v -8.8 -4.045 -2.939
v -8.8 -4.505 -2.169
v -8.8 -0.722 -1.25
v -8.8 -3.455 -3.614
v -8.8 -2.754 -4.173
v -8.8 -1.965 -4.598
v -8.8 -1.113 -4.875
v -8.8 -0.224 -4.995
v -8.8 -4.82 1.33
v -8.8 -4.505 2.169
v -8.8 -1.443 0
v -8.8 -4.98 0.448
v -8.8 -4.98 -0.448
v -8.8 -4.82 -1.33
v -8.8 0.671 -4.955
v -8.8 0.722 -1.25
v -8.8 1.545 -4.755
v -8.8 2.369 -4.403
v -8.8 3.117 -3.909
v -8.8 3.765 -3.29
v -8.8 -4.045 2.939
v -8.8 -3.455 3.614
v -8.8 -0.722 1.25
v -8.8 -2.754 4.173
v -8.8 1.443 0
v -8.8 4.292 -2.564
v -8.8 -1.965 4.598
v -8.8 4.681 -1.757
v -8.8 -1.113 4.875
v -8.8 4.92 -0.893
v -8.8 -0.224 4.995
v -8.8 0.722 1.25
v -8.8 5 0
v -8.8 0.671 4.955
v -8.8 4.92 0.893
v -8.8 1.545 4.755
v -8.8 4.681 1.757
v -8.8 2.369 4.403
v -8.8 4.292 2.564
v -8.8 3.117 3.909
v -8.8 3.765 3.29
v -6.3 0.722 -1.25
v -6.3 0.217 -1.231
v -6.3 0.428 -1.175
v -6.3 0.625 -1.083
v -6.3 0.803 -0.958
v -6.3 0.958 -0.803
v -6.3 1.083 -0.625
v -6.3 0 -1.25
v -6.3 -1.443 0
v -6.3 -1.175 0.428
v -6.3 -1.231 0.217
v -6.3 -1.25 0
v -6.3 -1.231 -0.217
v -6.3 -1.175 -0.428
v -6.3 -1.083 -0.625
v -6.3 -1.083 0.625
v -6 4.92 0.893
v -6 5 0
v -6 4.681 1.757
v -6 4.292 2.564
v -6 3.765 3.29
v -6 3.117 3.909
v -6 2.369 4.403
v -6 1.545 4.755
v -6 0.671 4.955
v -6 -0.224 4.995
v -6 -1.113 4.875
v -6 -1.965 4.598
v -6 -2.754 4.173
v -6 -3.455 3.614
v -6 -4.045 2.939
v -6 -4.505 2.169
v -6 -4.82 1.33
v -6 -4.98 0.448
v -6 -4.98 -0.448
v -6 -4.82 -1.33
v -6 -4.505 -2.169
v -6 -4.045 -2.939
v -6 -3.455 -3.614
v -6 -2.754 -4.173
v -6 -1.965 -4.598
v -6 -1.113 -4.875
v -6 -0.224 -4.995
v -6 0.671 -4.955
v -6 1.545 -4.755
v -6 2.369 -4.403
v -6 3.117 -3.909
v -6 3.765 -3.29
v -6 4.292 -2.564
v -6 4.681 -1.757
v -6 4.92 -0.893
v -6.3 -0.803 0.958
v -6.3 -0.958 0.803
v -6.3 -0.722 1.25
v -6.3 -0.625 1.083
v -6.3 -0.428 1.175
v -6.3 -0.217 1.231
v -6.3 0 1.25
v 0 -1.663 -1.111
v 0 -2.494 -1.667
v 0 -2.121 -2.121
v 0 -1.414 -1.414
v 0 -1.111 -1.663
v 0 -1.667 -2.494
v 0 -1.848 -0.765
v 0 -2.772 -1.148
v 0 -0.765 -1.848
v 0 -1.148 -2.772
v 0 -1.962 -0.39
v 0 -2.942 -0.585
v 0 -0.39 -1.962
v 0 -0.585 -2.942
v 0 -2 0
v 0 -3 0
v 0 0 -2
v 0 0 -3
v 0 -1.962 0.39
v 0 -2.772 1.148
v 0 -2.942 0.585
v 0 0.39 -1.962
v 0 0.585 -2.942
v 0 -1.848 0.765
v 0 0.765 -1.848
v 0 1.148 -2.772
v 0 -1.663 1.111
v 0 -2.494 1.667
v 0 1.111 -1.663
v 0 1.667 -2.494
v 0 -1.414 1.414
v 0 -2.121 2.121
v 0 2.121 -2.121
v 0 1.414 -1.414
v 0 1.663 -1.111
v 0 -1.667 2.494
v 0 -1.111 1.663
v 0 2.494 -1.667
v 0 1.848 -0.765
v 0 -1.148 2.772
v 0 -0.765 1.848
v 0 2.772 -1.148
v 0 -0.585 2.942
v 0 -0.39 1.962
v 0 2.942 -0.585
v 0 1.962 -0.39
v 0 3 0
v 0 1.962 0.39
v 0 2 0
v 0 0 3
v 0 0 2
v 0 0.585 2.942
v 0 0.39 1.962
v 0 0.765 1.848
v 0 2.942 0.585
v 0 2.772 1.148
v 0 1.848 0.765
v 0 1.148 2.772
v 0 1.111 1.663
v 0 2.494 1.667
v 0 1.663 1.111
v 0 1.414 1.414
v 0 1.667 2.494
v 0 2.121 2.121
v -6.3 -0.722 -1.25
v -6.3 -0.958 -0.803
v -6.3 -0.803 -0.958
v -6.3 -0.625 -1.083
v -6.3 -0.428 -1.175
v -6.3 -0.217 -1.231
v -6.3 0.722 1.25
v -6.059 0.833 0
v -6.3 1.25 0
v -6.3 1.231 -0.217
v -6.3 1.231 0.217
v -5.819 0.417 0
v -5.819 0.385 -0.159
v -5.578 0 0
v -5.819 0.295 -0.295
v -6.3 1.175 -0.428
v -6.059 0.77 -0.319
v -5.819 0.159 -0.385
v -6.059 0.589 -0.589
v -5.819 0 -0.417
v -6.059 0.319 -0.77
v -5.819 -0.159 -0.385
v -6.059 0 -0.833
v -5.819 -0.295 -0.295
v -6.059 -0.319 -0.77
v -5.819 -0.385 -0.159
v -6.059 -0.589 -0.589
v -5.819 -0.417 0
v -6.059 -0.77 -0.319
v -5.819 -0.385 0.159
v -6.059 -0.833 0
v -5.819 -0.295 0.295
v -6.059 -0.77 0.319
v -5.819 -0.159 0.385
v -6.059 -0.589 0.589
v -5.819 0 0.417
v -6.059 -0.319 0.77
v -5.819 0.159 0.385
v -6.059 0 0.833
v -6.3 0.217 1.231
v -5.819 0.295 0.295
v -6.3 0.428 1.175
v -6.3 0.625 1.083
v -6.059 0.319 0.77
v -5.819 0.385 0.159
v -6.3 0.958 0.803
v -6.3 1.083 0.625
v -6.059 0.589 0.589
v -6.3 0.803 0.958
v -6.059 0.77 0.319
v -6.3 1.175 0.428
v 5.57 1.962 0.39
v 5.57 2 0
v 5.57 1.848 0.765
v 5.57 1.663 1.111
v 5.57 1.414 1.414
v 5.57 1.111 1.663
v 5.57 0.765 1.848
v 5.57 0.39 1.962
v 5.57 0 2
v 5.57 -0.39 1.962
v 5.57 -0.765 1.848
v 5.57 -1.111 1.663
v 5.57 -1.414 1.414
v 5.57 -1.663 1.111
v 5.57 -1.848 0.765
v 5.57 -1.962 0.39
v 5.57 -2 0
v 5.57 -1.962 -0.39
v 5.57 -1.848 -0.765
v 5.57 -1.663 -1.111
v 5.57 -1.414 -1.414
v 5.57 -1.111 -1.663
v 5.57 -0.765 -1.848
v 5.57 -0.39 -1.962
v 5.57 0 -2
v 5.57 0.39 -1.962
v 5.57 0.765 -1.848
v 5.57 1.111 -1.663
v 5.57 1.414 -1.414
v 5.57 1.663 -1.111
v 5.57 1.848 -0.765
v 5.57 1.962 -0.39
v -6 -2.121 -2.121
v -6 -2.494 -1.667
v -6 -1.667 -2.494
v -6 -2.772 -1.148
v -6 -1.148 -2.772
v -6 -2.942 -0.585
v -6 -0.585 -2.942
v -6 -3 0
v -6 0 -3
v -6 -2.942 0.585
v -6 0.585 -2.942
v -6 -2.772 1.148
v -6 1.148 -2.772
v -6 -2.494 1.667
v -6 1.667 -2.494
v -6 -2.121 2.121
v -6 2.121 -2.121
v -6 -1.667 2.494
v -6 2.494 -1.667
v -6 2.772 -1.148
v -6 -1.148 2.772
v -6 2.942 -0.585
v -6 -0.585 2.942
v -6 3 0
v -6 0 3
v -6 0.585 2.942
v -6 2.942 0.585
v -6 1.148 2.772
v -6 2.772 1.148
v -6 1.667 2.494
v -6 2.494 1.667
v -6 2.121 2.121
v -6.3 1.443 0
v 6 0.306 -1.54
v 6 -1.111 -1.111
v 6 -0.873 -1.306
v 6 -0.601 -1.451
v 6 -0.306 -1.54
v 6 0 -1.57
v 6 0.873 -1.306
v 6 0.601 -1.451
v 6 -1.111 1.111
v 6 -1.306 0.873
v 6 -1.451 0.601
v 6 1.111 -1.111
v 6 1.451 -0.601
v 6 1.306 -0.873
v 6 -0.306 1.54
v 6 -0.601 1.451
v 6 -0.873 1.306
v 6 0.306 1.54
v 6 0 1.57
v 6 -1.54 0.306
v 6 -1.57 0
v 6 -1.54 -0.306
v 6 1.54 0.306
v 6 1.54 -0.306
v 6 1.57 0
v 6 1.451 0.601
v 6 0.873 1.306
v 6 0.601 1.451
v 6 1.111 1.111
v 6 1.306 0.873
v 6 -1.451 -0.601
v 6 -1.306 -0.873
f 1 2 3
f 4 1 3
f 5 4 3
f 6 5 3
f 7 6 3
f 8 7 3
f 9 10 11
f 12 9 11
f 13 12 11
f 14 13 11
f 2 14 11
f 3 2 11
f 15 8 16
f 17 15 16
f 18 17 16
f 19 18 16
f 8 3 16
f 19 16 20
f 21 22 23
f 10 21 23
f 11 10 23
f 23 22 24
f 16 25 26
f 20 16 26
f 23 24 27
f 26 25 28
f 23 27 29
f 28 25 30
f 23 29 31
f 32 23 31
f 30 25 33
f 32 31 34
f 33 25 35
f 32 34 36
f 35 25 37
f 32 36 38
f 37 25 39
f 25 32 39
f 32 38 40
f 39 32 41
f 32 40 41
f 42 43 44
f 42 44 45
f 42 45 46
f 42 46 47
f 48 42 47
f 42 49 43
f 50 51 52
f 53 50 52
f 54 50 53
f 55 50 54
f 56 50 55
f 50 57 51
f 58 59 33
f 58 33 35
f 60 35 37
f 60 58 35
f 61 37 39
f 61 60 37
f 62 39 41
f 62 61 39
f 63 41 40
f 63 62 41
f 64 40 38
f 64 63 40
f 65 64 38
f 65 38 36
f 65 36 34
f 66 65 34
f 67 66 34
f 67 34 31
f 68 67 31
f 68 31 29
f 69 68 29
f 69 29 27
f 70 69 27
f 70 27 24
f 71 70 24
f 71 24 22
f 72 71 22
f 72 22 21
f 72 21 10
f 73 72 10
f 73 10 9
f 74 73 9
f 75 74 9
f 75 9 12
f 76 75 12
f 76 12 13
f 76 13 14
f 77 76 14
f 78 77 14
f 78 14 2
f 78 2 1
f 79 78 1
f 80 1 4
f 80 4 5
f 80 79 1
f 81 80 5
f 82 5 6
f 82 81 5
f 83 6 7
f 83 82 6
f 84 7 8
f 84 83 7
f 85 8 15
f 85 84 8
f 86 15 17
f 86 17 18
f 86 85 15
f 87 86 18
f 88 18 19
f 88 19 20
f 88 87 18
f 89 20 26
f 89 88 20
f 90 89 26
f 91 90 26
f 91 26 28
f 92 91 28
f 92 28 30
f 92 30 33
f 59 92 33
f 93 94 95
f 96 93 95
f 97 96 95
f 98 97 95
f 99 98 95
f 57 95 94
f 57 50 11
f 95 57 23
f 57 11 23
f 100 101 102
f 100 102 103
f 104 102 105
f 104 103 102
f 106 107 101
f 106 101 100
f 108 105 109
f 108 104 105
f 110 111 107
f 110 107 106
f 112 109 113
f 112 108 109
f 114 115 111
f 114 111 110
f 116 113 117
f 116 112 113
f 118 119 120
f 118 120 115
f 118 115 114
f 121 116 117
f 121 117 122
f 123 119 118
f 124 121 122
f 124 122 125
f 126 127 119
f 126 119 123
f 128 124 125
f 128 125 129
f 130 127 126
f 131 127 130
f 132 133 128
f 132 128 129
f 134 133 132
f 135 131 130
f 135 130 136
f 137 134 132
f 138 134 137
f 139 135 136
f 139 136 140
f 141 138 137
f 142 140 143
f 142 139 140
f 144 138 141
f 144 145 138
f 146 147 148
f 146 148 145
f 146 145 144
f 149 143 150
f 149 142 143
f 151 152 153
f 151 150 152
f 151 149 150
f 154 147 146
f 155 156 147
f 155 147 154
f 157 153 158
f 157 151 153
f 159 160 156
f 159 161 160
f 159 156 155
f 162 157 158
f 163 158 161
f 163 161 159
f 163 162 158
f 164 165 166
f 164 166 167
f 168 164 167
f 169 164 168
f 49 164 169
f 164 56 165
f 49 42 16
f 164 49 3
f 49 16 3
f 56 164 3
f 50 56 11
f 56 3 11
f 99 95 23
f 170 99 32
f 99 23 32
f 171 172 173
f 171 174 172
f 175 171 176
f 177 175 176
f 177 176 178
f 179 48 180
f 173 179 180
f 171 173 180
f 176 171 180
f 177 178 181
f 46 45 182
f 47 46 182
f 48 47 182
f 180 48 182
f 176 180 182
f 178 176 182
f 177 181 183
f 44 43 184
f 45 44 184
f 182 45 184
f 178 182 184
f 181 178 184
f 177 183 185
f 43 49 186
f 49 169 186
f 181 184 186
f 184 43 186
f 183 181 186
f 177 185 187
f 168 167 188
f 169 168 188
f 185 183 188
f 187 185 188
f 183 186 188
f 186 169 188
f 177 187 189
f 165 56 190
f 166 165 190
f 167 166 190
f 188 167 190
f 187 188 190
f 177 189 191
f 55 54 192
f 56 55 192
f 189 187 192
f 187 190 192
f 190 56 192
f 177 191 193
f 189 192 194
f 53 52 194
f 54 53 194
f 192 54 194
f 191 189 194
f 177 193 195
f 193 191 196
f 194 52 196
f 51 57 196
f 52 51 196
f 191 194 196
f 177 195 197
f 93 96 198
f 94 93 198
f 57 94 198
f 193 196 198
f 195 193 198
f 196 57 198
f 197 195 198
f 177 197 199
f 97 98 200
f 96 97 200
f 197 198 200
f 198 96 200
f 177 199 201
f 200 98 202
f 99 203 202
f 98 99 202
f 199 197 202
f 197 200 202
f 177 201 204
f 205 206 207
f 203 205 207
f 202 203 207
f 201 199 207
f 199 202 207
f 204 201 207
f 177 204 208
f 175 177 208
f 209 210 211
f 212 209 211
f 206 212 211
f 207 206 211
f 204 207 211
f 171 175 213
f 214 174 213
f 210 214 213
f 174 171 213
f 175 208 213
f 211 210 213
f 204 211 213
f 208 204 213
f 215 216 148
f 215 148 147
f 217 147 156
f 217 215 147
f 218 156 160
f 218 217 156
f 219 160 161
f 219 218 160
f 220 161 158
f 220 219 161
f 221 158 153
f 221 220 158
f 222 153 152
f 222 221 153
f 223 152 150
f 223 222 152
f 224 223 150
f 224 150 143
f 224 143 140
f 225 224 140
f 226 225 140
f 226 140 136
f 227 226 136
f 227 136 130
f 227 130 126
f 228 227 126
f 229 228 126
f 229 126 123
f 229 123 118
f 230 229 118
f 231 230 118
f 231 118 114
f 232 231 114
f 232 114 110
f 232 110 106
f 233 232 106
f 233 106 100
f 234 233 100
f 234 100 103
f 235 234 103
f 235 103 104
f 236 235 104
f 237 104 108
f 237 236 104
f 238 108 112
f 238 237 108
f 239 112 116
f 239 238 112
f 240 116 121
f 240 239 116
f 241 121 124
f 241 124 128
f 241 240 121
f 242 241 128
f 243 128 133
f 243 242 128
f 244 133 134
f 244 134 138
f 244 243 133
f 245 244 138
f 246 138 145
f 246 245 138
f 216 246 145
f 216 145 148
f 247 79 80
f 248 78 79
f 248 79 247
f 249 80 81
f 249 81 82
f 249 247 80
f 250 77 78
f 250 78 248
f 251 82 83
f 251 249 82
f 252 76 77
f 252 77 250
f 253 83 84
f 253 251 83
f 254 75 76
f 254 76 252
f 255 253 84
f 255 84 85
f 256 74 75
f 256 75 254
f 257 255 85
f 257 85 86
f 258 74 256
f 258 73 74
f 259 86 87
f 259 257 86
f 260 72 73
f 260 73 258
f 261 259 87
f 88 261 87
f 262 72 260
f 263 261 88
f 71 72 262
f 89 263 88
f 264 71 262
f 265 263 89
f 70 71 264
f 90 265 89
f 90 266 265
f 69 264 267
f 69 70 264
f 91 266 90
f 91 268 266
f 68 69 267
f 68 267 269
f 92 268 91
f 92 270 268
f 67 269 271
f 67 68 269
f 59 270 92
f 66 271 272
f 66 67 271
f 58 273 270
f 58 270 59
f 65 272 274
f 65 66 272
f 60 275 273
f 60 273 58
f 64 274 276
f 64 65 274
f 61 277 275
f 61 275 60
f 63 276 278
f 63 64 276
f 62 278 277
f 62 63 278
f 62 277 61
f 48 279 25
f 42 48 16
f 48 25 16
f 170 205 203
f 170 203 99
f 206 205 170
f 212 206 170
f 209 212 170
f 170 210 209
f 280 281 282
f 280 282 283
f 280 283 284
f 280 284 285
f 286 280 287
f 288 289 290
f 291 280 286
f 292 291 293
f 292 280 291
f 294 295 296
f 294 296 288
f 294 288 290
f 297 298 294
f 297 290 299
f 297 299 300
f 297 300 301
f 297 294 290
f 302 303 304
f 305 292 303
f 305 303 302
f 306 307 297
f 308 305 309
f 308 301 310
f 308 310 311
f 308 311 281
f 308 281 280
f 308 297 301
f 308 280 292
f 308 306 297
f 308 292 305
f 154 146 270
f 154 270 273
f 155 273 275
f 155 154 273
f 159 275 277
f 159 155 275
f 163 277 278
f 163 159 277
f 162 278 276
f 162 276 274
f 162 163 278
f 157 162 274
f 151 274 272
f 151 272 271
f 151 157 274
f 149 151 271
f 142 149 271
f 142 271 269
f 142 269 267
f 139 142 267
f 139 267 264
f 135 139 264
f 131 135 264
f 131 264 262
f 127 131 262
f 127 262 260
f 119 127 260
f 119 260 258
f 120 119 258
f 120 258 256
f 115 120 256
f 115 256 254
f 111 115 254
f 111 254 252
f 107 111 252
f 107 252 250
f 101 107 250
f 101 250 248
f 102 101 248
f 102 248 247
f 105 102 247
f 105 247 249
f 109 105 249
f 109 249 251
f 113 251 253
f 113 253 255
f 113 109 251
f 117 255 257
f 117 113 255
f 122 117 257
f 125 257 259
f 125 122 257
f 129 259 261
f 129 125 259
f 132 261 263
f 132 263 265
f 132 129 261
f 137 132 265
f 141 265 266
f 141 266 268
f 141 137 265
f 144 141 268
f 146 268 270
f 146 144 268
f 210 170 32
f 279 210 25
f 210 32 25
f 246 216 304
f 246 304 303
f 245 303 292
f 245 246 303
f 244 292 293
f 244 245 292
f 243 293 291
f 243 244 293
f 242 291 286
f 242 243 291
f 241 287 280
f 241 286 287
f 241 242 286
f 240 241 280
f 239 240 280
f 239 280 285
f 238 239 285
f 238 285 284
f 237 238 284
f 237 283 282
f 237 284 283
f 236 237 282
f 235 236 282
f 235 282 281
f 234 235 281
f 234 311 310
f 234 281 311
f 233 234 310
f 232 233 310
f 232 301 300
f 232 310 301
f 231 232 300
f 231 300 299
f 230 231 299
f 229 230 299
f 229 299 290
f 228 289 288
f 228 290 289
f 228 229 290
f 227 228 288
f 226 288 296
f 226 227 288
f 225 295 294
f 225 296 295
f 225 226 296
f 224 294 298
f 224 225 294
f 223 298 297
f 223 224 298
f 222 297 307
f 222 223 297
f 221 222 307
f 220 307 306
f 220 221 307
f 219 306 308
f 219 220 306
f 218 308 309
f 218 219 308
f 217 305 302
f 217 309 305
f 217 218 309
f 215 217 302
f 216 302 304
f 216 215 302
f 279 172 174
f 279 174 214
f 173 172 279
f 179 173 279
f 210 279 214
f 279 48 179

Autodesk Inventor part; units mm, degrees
ref_plane "YZ Plane" through (0, 0, 0) normal (1, 0, 0) x (0, 1, 0)
ref_plane "XZ Plane" through (0, 0, 0) normal (0, 1, 0) x (-1, 0, 0)
ref_plane "XY Plane" through (0, 0, 0) normal (0, 0, 1) x (1, 0, 0)
sketch "Sketch_1" plane through (0, 0, 0) normal (0, 0, 1) x (1, 0, 0)
  line L0 (6, 0) -> (-8.8, 0)
  line L1 (-8.8, 0) -> (-8.8, 5)
  line L2 (-8.8, 5) -> (-6, 5)
  line L3 (-6, 5) -> (-6, 3)
  line L4 (-6, 3) -> (0, 3)
  line L5 (0, 3) -> (0, 2)
  line L6 (0, 2) -> (5.5705, 2)
  line L7 (5.5705, 2) -> (6, 1.5705)
  line L8 (6, 1.5705) -> (6, 0)
  line L9 (6, 0) -> (-8.8, 0)
revolve "Revolution1" add sketch "Sketch_1" angle 360 about axis through (6, 0, 0) along (1, 0, 0)
thread "Thread1" size "M4x0.7" class "6g" standard "ISO Metric profile" length 4.3705
sketch "Sketch_2" plane through (-8.8, 0, 0) normal (-1, 0, 0) x (0, 1, 0)
  line L0 (-1.4434, 0) -> (-0.7217, -1.25)
  line L1 (-0.7217, -1.25) -> (0.7217, -1.25)
  line L2 (0.7217, -1.25) -> (1.4434, 0)
  line L3 (1.4434, 0) -> (0.7217, 1.25)
  line L4 (0.7217, 1.25) -> (-0.7217, 1.25)
  line L5 (-0.7217, 1.25) -> (-1.4434, 0)
extrude "Extrusion1" cut sketch "Sketch_2" against normal blind 2.5
sketch "Sketch_3" plane through (0, 0, 0) normal (0, 0, 1) x (1, 0, 0)
  line L0 (-5.5783, 0) -> (-6.3, 0)
  line L1 (-6.3, 0) -> (-6.3, 1.25)
  line L2 (-6.3, 1.25) -> (-5.5783, 0)
  line L3 (-5.5783, 0) -> (-6.3, 0)
revolve "Revolution2" cut sketch "Sketch_3" angle 360 about axis through (-5.5783, 0, 0) along (1, 0, 0)
properties part number "DBB4-6-6" material "스테인리스스틸"
